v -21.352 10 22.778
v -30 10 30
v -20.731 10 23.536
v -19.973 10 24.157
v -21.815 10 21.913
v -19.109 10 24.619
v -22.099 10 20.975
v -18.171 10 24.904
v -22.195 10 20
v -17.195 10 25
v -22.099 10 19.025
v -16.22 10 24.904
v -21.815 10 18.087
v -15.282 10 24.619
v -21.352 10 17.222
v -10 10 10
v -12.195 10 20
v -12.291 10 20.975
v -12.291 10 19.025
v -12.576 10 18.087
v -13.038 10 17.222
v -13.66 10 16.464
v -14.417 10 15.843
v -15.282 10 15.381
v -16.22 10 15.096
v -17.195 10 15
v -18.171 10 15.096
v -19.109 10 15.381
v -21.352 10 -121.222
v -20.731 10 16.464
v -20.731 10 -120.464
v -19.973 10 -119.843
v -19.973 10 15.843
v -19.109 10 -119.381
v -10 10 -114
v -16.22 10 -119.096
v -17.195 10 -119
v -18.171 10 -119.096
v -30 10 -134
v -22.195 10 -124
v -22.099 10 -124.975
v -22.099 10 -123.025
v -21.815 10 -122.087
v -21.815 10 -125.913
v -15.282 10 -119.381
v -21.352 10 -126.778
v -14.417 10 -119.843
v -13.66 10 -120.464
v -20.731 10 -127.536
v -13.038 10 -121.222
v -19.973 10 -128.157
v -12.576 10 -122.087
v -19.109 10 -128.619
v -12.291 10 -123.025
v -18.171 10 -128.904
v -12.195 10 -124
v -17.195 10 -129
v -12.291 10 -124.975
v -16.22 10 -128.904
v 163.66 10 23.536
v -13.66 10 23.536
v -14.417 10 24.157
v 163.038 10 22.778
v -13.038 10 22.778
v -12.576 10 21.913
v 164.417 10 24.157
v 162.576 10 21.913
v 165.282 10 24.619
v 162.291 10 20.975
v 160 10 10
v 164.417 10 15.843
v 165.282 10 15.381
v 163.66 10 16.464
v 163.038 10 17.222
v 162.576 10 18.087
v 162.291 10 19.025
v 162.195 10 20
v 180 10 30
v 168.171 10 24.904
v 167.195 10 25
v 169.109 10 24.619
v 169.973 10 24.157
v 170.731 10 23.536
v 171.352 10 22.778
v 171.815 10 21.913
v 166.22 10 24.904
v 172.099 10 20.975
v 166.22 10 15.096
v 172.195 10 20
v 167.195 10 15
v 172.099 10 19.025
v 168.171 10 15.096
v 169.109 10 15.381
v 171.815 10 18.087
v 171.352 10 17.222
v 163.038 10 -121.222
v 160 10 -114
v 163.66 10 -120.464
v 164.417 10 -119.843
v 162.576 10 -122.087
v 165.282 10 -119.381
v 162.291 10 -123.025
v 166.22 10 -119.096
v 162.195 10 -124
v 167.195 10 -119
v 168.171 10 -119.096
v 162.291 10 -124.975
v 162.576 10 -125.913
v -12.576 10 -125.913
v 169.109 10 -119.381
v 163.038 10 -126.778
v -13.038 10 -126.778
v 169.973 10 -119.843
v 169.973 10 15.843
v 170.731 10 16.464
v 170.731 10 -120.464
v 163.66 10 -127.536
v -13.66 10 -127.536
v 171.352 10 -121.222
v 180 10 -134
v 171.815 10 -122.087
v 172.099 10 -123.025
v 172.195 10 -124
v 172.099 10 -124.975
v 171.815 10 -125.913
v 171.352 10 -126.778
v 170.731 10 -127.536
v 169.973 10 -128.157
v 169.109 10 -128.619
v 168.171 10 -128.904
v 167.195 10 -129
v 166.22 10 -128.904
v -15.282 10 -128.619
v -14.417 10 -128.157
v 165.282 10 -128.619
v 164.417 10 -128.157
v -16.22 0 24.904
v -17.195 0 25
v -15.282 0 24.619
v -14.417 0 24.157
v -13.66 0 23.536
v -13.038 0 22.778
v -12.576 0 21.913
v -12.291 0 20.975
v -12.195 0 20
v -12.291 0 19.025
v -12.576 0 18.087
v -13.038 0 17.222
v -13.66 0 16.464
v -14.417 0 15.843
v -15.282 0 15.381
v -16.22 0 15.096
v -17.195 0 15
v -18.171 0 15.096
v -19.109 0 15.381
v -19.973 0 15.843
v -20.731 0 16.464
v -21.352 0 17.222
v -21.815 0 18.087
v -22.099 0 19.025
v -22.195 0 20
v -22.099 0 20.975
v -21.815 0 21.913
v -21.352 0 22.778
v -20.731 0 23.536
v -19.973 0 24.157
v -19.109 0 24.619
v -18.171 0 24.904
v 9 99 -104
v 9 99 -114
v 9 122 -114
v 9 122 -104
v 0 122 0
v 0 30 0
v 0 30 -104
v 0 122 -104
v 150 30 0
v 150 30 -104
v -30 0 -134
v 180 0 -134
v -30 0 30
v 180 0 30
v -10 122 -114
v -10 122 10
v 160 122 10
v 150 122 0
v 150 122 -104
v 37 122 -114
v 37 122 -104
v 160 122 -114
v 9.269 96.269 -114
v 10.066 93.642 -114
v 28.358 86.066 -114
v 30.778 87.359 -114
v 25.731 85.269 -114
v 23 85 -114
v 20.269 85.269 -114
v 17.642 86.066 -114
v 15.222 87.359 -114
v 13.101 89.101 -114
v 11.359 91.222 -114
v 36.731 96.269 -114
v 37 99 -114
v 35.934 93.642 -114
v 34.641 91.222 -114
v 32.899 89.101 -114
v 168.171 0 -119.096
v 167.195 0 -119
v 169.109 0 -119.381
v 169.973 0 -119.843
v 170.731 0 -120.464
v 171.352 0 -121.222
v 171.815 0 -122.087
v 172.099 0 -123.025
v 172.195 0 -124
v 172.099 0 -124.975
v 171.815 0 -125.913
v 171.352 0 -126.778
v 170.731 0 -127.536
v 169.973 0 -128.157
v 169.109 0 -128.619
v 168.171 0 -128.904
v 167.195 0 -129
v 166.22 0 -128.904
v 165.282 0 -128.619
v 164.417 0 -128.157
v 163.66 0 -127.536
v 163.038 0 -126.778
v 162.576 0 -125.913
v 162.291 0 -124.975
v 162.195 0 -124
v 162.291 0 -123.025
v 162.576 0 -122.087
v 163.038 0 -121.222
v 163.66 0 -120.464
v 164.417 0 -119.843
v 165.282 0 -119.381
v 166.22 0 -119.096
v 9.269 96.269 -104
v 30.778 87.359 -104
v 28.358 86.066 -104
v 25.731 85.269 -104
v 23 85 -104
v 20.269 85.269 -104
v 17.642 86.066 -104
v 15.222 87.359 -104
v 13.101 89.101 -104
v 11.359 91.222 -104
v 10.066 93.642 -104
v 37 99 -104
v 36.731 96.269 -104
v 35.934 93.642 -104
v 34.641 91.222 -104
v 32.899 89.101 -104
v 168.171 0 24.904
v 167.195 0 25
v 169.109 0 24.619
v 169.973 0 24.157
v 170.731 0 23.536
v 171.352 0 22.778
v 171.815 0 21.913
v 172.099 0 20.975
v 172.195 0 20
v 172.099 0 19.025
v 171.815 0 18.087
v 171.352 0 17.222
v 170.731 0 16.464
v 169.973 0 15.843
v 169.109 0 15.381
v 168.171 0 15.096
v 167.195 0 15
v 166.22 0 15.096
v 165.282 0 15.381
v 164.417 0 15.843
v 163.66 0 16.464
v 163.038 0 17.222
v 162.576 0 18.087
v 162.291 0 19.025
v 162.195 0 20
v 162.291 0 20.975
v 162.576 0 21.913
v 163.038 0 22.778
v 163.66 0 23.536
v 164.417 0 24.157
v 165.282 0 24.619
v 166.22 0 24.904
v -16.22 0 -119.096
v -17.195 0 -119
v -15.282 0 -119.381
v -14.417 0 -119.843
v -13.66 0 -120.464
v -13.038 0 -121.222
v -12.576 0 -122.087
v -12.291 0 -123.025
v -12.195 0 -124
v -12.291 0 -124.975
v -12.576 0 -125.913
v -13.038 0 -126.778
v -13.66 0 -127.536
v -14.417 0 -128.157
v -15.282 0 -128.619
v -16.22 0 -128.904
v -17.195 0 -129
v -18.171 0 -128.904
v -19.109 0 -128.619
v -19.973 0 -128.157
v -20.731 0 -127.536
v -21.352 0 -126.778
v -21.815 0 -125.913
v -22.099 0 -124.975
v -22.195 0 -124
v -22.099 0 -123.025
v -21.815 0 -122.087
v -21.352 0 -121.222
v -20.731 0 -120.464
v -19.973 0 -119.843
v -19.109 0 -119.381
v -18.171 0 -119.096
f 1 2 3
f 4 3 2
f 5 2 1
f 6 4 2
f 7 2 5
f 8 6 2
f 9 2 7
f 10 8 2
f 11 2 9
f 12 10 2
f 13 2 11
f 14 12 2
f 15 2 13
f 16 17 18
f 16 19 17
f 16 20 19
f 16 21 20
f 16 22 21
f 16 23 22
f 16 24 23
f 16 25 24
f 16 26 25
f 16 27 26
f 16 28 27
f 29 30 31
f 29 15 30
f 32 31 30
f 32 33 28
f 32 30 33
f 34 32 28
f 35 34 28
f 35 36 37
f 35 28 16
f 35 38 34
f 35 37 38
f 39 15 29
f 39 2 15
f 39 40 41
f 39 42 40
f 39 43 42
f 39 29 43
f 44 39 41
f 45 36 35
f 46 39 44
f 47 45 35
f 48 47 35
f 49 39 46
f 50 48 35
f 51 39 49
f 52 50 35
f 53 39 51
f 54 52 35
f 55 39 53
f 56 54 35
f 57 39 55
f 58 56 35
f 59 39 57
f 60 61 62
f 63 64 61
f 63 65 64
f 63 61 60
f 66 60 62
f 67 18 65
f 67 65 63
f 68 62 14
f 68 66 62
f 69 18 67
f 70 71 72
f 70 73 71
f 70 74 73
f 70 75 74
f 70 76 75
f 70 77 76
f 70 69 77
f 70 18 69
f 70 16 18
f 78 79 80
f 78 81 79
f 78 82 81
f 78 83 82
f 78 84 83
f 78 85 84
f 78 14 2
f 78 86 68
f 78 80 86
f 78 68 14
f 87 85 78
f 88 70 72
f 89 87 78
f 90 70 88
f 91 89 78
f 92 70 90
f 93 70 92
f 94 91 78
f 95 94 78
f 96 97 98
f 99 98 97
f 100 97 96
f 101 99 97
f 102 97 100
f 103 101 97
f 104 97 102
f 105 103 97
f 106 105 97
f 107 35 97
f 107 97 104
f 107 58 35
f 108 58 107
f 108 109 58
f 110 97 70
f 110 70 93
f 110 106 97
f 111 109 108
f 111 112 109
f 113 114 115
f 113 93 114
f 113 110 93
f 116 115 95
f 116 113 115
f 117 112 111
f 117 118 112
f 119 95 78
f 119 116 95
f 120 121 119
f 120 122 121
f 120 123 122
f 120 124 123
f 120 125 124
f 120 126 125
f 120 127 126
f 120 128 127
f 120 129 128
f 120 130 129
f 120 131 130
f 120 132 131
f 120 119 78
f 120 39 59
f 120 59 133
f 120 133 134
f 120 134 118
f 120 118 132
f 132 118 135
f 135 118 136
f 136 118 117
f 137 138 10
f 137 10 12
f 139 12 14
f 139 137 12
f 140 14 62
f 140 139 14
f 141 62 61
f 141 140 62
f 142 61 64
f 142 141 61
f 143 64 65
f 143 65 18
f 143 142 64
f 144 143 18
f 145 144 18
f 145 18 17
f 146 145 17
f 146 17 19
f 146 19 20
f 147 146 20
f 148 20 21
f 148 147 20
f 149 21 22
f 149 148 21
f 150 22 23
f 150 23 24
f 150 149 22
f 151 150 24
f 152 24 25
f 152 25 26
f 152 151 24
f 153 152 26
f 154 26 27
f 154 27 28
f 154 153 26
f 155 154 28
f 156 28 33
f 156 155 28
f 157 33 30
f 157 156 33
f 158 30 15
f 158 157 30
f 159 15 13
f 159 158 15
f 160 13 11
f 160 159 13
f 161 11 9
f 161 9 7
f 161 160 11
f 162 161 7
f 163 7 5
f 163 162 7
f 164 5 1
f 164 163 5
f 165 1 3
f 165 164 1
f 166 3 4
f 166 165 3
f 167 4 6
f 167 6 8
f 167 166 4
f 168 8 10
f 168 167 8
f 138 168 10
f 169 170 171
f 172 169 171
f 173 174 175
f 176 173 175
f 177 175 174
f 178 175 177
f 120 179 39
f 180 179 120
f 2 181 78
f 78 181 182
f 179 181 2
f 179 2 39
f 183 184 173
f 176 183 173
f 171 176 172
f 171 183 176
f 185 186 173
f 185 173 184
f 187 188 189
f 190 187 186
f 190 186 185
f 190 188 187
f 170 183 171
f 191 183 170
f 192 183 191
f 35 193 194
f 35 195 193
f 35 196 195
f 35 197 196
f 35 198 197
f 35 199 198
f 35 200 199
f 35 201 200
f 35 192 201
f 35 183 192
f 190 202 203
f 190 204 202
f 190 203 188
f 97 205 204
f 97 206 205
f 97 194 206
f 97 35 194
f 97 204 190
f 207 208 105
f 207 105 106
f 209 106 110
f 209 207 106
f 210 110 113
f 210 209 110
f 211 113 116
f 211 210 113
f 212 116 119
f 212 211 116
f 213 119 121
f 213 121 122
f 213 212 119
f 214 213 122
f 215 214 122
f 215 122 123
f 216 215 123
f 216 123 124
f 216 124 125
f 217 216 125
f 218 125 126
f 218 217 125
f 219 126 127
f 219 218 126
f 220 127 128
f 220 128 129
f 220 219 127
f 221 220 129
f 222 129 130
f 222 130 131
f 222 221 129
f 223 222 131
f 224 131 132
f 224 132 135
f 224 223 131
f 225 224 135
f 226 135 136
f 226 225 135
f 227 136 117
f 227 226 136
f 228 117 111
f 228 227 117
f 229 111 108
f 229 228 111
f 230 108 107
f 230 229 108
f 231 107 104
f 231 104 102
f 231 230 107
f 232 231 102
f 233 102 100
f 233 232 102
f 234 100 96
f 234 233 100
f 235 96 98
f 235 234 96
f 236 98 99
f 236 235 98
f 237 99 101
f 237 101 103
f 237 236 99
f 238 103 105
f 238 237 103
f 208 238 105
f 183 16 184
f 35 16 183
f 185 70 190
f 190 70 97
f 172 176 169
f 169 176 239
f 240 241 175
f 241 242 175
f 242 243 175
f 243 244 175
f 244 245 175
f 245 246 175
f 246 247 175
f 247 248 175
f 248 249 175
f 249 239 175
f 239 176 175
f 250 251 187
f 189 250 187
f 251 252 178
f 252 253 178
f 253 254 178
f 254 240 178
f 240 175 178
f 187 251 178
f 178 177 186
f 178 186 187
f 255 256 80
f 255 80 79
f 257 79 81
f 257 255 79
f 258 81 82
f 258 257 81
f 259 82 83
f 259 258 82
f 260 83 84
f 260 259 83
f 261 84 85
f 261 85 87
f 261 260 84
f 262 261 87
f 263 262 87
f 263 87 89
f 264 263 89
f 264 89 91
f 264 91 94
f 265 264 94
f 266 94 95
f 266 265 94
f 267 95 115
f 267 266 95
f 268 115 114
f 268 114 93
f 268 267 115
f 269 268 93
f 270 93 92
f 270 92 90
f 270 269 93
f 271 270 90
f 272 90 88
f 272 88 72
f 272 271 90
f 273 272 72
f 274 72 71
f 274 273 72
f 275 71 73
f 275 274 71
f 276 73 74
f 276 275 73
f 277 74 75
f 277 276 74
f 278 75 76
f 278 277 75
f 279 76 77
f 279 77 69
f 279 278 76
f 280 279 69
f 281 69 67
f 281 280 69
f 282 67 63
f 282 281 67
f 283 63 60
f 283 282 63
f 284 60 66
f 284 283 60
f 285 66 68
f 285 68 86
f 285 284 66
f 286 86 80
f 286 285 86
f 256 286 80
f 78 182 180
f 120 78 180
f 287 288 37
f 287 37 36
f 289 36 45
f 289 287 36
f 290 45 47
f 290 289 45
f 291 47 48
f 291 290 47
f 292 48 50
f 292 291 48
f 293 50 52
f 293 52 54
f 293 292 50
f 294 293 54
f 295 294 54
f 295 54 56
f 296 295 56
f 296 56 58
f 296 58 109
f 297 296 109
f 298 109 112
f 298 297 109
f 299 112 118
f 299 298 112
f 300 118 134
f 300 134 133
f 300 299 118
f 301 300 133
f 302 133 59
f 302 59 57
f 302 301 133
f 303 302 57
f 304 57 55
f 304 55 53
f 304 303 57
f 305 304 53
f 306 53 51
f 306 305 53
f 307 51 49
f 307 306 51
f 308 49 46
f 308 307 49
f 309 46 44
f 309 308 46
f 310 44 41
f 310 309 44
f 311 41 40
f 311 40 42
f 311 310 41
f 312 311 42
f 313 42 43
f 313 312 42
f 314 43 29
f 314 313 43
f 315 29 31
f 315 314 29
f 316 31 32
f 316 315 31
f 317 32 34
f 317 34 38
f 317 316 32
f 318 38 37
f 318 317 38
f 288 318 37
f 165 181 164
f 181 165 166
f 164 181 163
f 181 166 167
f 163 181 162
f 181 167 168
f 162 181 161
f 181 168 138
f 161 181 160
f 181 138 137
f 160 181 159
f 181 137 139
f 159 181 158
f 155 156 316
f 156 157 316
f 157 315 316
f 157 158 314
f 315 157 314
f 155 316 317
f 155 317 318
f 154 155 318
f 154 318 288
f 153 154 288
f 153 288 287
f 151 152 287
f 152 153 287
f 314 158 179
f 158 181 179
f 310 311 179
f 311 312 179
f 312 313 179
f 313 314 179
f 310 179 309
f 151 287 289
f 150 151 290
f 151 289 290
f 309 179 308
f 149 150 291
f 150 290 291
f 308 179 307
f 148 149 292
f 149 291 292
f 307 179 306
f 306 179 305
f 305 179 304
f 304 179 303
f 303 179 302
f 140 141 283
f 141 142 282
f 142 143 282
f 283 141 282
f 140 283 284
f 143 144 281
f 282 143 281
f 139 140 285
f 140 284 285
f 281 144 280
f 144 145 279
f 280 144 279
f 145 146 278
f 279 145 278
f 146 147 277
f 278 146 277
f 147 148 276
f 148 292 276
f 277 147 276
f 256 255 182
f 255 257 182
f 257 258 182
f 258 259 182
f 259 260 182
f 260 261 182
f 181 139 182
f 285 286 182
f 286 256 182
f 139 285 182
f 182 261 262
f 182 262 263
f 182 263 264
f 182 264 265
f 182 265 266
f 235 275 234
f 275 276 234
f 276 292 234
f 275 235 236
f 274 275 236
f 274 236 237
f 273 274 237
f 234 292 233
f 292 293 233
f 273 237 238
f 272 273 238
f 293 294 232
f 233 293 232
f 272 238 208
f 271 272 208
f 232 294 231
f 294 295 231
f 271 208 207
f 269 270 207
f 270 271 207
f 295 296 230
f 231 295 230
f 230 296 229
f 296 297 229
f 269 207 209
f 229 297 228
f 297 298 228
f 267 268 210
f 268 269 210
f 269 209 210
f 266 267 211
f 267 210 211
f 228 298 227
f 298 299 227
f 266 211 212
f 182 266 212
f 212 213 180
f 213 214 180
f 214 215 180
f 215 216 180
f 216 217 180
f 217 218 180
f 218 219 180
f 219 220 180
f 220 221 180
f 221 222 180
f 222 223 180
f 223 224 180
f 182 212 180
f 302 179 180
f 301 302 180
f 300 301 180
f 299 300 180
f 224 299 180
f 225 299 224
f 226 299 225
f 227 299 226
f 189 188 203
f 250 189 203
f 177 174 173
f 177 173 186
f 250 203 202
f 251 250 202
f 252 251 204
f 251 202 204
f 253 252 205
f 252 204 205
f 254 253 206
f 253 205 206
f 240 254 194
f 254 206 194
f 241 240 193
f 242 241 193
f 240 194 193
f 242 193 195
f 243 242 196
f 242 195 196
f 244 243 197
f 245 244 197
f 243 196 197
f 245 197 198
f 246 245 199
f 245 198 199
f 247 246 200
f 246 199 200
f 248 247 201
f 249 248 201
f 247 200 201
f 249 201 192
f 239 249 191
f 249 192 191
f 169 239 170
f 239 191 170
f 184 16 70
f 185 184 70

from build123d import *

# Parameters (mm, degrees)
SKETCH1_W           = 150
SKETCH1_H           = 104
BOSS_EXTRUDE1_DEPTH = 30
SKETCH2_W           = 170
SKETCH2_H           = 124
SKETCH2_W_2         = 150
SKETCH2_H_2         = 104
BOSS_EXTRUDE2_DEPTH = 122
CUT_EXTRUDE2_DEPTH  = 10
SKETCH6_W           = 210
SKETCH6_H           = 164
SKETCH6_R           = 5
BOSS_EXTRUDE3_DEPTH = 10


with BuildPart() as part:
    # Sketch1 → Boss-Extrude1 (new body)
    with BuildSketch(Plane(origin=(0, 0, 0), x_dir=(1, 0, 0), z_dir=(0, 1, 0))):
        with Locations((75, 52)):
            Rectangle(SKETCH1_W, SKETCH1_H)
    extrude(amount=BOSS_EXTRUDE1_DEPTH)

    # Sketch2 → Boss-Extrude2 (add)
    with BuildSketch(Plane(origin=(0, 0, 0), x_dir=(1, 0, 0), z_dir=(0, 1, 0))):
        with Locations((75, 52)):
            Rectangle(SKETCH2_W, SKETCH2_H)
        with Locations((75, 52)):
            Rectangle(SKETCH2_W_2, SKETCH2_H_2, mode=Mode.SUBTRACT)
    extrude(amount=BOSS_EXTRUDE2_DEPTH)

    # Sketch5 → Cut-Extrude2 (cut)
    with BuildSketch(Plane(origin=(0, 0, -114), x_dir=(-1, 0, 0), z_dir=(0, 0, -1))):
        with BuildLine():
            Line((-37, 122), (-37, 99))
            ThreePointArc((-37, 99), (-23, 85), (-9, 99))
            Line((-9, 99), (-9, 122))
            Line((-9, 122), (-37, 122))
        make_face()
    extrude(amount=-CUT_EXTRUDE2_DEPTH, mode=Mode.SUBTRACT)

    # Sketch6 → Boss-Extrude3 (add)
    with BuildSketch(Plane(origin=(0, 0, 0), x_dir=(1, 0, 0), z_dir=(0, 1, 0))):
        with Locations((75, 52)):
            Rectangle(SKETCH6_W, SKETCH6_H)
        with Locations(Location((-17.195121951, -20, 0), (0, 0, 270))):
            Circle(SKETCH6_R, mode=Mode.SUBTRACT)
        with Locations(Location((167.195121951, -20, 0), (0, 0, 270))):
            Circle(SKETCH6_R, mode=Mode.SUBTRACT)
        with Locations(Location((167.195121951, 124, 0), (0, 0, 270))):
            Circle(SKETCH6_R, mode=Mode.SUBTRACT)
        with Locations(Location((-17.195121951, 124, 0), (0, 0, 270))):
            Circle(SKETCH6_R, mode=Mode.SUBTRACT)
    extrude(amount=BOSS_EXTRUDE3_DEPTH)


solid = part.part
